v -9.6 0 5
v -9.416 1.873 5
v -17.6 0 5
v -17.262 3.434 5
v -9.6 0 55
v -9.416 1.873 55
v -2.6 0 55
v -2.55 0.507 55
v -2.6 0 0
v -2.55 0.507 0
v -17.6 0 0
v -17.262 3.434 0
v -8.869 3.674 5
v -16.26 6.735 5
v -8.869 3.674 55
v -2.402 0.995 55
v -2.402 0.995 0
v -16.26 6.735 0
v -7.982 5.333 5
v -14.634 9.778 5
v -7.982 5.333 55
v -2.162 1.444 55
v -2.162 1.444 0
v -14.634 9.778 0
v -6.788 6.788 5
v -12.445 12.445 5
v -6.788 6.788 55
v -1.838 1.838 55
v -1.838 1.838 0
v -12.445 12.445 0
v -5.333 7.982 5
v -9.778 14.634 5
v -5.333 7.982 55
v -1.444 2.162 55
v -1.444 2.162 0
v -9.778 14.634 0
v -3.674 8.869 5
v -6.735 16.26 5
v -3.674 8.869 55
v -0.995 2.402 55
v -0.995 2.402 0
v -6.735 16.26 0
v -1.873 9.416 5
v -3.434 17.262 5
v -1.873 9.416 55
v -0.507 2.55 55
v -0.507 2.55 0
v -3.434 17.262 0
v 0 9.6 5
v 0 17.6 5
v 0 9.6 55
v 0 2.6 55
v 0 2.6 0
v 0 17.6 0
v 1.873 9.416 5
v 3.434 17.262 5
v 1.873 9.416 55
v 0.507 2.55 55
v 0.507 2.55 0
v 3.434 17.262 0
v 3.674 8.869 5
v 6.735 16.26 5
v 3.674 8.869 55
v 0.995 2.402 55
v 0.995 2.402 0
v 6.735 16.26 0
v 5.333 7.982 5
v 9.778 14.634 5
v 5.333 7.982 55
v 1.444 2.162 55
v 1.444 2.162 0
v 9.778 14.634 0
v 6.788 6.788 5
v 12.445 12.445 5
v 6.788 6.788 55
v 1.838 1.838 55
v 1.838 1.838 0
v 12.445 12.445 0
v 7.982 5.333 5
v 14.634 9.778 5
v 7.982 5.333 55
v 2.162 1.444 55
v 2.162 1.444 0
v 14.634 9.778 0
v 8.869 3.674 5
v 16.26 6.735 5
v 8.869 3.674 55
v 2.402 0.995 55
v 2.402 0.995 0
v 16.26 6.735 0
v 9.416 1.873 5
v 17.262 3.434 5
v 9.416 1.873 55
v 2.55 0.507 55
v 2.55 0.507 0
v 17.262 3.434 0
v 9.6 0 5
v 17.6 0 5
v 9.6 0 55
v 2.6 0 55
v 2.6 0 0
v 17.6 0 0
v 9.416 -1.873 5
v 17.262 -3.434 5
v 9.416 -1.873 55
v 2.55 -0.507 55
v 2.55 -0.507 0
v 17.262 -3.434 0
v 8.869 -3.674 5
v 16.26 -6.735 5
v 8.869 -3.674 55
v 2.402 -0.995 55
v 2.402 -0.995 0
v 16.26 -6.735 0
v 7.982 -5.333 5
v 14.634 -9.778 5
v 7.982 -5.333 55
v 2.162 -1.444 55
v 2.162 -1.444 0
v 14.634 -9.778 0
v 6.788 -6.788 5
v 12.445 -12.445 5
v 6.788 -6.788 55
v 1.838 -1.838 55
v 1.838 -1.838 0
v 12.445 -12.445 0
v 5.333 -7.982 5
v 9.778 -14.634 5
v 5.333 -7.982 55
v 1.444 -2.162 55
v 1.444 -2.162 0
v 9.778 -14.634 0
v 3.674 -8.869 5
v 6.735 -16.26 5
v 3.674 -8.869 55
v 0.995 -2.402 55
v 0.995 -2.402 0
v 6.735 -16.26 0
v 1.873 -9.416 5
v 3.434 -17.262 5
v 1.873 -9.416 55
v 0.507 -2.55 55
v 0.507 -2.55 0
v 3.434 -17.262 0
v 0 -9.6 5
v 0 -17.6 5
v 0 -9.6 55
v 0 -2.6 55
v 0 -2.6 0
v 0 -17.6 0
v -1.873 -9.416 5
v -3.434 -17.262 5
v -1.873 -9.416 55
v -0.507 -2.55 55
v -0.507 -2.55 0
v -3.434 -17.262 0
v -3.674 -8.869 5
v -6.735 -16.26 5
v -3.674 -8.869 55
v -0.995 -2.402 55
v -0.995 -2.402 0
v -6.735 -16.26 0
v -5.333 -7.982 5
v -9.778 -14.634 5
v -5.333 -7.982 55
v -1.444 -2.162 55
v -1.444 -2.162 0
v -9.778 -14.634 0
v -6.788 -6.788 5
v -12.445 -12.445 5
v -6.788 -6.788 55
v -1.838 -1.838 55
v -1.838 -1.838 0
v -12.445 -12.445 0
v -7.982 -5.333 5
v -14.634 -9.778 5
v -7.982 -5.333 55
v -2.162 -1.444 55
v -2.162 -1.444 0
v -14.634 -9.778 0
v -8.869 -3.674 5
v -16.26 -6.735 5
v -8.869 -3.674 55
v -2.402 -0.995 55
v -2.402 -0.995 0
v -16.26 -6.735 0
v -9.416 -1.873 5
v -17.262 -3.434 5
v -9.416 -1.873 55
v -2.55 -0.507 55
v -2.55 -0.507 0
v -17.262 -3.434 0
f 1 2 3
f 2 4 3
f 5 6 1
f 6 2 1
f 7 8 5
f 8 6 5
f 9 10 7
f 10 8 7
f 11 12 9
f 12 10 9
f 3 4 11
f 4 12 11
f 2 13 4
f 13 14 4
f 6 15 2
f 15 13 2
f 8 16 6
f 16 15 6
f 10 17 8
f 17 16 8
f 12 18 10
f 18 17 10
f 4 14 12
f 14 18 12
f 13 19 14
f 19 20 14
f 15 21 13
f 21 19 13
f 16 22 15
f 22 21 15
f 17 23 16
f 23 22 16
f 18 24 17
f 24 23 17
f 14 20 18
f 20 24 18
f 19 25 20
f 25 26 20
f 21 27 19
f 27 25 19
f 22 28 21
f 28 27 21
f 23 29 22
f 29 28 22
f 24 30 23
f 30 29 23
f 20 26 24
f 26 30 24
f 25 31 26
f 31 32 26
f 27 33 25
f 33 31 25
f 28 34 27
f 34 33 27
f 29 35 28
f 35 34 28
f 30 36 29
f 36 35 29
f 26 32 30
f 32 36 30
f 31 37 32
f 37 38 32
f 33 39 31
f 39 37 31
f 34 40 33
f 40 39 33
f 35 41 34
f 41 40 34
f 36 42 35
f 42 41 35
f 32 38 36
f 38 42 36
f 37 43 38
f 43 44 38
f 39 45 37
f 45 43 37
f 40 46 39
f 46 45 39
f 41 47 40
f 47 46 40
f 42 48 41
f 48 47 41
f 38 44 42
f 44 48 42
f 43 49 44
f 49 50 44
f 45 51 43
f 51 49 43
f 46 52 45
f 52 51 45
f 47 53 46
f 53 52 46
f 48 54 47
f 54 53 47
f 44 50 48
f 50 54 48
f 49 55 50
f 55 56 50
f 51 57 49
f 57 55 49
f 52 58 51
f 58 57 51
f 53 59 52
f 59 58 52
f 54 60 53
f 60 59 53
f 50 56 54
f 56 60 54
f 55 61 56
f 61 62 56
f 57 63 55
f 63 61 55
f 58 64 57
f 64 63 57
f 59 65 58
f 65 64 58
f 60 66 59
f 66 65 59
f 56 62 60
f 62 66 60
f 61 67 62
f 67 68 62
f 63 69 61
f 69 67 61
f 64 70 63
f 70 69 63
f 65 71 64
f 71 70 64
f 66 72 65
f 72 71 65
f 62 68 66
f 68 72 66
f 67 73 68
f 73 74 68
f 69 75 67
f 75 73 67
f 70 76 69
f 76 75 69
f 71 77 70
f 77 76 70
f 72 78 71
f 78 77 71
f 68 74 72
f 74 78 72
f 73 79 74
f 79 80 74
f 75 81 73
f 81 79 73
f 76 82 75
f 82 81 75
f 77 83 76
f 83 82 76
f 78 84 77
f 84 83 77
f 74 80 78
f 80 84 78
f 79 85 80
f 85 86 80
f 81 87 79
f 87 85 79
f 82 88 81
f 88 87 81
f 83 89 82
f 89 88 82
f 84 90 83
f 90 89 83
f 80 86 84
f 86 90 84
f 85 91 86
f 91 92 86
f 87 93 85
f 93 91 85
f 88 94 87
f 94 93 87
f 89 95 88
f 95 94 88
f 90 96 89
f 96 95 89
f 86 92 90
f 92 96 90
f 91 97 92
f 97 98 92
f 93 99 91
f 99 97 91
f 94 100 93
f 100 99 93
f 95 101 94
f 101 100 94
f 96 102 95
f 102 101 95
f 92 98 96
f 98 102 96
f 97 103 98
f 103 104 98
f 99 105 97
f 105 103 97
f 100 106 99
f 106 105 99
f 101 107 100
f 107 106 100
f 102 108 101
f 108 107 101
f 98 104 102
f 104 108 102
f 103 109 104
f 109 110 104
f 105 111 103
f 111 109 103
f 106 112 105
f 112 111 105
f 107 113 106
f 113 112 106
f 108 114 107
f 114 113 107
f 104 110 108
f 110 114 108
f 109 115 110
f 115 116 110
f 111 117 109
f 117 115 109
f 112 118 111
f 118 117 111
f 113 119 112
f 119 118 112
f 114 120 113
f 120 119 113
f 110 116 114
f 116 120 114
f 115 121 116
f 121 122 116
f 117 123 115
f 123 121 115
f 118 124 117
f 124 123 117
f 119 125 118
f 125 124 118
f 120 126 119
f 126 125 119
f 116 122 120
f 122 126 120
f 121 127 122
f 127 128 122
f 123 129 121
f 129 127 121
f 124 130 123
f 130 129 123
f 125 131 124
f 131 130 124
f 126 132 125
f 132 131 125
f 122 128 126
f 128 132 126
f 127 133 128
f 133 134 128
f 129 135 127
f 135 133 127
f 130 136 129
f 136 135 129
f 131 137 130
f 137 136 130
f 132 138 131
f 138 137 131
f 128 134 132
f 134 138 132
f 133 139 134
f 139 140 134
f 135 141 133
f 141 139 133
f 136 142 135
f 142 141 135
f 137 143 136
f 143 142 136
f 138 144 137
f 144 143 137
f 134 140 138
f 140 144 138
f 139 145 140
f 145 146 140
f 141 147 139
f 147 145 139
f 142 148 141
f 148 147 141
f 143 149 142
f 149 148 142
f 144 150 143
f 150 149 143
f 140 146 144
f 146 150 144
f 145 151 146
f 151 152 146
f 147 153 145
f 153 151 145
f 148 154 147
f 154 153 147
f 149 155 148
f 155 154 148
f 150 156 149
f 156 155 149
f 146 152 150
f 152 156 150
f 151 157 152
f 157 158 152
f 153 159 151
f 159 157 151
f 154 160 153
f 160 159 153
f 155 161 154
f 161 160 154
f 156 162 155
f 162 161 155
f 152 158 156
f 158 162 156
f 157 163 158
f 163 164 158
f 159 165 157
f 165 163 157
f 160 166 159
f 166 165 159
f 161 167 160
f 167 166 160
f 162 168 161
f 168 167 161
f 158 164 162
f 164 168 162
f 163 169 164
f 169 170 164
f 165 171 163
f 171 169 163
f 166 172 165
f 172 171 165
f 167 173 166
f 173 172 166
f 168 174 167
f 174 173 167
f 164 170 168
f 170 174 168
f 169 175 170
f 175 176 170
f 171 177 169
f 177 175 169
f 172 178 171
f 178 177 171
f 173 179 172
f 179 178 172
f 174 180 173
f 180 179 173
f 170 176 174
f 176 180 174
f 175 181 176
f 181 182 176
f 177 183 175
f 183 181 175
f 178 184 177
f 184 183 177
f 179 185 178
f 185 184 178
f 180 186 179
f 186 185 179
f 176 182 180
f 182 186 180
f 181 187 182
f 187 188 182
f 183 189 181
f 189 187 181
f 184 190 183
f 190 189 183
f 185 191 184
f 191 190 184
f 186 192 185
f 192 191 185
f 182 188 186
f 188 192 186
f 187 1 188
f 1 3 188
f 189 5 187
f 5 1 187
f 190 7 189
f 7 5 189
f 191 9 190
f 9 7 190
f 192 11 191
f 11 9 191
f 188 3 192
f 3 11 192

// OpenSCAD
$fn = 32;

// ----------------------------------------------------------------------
// Profiled standoff: flanged spacer, 55 mm long, bore 5.2 mm
// ----------------------------------------------------------------------

// --- parameters (mm) ---
revolve_angle = 360;      // full turn around the Z axis
profile_points = 6;       // points of the closed outline

profile = [[2.6, 0], [17.6, 0], [17.6, 5], [9.6, 5], [9.6, 55], [2.6, 55]];  // single closed polygon, 6 points, counter clockwise

// --- the one profile operation ---
rotate_extrude(angle = revolve_angle) polygon(points = profile);
